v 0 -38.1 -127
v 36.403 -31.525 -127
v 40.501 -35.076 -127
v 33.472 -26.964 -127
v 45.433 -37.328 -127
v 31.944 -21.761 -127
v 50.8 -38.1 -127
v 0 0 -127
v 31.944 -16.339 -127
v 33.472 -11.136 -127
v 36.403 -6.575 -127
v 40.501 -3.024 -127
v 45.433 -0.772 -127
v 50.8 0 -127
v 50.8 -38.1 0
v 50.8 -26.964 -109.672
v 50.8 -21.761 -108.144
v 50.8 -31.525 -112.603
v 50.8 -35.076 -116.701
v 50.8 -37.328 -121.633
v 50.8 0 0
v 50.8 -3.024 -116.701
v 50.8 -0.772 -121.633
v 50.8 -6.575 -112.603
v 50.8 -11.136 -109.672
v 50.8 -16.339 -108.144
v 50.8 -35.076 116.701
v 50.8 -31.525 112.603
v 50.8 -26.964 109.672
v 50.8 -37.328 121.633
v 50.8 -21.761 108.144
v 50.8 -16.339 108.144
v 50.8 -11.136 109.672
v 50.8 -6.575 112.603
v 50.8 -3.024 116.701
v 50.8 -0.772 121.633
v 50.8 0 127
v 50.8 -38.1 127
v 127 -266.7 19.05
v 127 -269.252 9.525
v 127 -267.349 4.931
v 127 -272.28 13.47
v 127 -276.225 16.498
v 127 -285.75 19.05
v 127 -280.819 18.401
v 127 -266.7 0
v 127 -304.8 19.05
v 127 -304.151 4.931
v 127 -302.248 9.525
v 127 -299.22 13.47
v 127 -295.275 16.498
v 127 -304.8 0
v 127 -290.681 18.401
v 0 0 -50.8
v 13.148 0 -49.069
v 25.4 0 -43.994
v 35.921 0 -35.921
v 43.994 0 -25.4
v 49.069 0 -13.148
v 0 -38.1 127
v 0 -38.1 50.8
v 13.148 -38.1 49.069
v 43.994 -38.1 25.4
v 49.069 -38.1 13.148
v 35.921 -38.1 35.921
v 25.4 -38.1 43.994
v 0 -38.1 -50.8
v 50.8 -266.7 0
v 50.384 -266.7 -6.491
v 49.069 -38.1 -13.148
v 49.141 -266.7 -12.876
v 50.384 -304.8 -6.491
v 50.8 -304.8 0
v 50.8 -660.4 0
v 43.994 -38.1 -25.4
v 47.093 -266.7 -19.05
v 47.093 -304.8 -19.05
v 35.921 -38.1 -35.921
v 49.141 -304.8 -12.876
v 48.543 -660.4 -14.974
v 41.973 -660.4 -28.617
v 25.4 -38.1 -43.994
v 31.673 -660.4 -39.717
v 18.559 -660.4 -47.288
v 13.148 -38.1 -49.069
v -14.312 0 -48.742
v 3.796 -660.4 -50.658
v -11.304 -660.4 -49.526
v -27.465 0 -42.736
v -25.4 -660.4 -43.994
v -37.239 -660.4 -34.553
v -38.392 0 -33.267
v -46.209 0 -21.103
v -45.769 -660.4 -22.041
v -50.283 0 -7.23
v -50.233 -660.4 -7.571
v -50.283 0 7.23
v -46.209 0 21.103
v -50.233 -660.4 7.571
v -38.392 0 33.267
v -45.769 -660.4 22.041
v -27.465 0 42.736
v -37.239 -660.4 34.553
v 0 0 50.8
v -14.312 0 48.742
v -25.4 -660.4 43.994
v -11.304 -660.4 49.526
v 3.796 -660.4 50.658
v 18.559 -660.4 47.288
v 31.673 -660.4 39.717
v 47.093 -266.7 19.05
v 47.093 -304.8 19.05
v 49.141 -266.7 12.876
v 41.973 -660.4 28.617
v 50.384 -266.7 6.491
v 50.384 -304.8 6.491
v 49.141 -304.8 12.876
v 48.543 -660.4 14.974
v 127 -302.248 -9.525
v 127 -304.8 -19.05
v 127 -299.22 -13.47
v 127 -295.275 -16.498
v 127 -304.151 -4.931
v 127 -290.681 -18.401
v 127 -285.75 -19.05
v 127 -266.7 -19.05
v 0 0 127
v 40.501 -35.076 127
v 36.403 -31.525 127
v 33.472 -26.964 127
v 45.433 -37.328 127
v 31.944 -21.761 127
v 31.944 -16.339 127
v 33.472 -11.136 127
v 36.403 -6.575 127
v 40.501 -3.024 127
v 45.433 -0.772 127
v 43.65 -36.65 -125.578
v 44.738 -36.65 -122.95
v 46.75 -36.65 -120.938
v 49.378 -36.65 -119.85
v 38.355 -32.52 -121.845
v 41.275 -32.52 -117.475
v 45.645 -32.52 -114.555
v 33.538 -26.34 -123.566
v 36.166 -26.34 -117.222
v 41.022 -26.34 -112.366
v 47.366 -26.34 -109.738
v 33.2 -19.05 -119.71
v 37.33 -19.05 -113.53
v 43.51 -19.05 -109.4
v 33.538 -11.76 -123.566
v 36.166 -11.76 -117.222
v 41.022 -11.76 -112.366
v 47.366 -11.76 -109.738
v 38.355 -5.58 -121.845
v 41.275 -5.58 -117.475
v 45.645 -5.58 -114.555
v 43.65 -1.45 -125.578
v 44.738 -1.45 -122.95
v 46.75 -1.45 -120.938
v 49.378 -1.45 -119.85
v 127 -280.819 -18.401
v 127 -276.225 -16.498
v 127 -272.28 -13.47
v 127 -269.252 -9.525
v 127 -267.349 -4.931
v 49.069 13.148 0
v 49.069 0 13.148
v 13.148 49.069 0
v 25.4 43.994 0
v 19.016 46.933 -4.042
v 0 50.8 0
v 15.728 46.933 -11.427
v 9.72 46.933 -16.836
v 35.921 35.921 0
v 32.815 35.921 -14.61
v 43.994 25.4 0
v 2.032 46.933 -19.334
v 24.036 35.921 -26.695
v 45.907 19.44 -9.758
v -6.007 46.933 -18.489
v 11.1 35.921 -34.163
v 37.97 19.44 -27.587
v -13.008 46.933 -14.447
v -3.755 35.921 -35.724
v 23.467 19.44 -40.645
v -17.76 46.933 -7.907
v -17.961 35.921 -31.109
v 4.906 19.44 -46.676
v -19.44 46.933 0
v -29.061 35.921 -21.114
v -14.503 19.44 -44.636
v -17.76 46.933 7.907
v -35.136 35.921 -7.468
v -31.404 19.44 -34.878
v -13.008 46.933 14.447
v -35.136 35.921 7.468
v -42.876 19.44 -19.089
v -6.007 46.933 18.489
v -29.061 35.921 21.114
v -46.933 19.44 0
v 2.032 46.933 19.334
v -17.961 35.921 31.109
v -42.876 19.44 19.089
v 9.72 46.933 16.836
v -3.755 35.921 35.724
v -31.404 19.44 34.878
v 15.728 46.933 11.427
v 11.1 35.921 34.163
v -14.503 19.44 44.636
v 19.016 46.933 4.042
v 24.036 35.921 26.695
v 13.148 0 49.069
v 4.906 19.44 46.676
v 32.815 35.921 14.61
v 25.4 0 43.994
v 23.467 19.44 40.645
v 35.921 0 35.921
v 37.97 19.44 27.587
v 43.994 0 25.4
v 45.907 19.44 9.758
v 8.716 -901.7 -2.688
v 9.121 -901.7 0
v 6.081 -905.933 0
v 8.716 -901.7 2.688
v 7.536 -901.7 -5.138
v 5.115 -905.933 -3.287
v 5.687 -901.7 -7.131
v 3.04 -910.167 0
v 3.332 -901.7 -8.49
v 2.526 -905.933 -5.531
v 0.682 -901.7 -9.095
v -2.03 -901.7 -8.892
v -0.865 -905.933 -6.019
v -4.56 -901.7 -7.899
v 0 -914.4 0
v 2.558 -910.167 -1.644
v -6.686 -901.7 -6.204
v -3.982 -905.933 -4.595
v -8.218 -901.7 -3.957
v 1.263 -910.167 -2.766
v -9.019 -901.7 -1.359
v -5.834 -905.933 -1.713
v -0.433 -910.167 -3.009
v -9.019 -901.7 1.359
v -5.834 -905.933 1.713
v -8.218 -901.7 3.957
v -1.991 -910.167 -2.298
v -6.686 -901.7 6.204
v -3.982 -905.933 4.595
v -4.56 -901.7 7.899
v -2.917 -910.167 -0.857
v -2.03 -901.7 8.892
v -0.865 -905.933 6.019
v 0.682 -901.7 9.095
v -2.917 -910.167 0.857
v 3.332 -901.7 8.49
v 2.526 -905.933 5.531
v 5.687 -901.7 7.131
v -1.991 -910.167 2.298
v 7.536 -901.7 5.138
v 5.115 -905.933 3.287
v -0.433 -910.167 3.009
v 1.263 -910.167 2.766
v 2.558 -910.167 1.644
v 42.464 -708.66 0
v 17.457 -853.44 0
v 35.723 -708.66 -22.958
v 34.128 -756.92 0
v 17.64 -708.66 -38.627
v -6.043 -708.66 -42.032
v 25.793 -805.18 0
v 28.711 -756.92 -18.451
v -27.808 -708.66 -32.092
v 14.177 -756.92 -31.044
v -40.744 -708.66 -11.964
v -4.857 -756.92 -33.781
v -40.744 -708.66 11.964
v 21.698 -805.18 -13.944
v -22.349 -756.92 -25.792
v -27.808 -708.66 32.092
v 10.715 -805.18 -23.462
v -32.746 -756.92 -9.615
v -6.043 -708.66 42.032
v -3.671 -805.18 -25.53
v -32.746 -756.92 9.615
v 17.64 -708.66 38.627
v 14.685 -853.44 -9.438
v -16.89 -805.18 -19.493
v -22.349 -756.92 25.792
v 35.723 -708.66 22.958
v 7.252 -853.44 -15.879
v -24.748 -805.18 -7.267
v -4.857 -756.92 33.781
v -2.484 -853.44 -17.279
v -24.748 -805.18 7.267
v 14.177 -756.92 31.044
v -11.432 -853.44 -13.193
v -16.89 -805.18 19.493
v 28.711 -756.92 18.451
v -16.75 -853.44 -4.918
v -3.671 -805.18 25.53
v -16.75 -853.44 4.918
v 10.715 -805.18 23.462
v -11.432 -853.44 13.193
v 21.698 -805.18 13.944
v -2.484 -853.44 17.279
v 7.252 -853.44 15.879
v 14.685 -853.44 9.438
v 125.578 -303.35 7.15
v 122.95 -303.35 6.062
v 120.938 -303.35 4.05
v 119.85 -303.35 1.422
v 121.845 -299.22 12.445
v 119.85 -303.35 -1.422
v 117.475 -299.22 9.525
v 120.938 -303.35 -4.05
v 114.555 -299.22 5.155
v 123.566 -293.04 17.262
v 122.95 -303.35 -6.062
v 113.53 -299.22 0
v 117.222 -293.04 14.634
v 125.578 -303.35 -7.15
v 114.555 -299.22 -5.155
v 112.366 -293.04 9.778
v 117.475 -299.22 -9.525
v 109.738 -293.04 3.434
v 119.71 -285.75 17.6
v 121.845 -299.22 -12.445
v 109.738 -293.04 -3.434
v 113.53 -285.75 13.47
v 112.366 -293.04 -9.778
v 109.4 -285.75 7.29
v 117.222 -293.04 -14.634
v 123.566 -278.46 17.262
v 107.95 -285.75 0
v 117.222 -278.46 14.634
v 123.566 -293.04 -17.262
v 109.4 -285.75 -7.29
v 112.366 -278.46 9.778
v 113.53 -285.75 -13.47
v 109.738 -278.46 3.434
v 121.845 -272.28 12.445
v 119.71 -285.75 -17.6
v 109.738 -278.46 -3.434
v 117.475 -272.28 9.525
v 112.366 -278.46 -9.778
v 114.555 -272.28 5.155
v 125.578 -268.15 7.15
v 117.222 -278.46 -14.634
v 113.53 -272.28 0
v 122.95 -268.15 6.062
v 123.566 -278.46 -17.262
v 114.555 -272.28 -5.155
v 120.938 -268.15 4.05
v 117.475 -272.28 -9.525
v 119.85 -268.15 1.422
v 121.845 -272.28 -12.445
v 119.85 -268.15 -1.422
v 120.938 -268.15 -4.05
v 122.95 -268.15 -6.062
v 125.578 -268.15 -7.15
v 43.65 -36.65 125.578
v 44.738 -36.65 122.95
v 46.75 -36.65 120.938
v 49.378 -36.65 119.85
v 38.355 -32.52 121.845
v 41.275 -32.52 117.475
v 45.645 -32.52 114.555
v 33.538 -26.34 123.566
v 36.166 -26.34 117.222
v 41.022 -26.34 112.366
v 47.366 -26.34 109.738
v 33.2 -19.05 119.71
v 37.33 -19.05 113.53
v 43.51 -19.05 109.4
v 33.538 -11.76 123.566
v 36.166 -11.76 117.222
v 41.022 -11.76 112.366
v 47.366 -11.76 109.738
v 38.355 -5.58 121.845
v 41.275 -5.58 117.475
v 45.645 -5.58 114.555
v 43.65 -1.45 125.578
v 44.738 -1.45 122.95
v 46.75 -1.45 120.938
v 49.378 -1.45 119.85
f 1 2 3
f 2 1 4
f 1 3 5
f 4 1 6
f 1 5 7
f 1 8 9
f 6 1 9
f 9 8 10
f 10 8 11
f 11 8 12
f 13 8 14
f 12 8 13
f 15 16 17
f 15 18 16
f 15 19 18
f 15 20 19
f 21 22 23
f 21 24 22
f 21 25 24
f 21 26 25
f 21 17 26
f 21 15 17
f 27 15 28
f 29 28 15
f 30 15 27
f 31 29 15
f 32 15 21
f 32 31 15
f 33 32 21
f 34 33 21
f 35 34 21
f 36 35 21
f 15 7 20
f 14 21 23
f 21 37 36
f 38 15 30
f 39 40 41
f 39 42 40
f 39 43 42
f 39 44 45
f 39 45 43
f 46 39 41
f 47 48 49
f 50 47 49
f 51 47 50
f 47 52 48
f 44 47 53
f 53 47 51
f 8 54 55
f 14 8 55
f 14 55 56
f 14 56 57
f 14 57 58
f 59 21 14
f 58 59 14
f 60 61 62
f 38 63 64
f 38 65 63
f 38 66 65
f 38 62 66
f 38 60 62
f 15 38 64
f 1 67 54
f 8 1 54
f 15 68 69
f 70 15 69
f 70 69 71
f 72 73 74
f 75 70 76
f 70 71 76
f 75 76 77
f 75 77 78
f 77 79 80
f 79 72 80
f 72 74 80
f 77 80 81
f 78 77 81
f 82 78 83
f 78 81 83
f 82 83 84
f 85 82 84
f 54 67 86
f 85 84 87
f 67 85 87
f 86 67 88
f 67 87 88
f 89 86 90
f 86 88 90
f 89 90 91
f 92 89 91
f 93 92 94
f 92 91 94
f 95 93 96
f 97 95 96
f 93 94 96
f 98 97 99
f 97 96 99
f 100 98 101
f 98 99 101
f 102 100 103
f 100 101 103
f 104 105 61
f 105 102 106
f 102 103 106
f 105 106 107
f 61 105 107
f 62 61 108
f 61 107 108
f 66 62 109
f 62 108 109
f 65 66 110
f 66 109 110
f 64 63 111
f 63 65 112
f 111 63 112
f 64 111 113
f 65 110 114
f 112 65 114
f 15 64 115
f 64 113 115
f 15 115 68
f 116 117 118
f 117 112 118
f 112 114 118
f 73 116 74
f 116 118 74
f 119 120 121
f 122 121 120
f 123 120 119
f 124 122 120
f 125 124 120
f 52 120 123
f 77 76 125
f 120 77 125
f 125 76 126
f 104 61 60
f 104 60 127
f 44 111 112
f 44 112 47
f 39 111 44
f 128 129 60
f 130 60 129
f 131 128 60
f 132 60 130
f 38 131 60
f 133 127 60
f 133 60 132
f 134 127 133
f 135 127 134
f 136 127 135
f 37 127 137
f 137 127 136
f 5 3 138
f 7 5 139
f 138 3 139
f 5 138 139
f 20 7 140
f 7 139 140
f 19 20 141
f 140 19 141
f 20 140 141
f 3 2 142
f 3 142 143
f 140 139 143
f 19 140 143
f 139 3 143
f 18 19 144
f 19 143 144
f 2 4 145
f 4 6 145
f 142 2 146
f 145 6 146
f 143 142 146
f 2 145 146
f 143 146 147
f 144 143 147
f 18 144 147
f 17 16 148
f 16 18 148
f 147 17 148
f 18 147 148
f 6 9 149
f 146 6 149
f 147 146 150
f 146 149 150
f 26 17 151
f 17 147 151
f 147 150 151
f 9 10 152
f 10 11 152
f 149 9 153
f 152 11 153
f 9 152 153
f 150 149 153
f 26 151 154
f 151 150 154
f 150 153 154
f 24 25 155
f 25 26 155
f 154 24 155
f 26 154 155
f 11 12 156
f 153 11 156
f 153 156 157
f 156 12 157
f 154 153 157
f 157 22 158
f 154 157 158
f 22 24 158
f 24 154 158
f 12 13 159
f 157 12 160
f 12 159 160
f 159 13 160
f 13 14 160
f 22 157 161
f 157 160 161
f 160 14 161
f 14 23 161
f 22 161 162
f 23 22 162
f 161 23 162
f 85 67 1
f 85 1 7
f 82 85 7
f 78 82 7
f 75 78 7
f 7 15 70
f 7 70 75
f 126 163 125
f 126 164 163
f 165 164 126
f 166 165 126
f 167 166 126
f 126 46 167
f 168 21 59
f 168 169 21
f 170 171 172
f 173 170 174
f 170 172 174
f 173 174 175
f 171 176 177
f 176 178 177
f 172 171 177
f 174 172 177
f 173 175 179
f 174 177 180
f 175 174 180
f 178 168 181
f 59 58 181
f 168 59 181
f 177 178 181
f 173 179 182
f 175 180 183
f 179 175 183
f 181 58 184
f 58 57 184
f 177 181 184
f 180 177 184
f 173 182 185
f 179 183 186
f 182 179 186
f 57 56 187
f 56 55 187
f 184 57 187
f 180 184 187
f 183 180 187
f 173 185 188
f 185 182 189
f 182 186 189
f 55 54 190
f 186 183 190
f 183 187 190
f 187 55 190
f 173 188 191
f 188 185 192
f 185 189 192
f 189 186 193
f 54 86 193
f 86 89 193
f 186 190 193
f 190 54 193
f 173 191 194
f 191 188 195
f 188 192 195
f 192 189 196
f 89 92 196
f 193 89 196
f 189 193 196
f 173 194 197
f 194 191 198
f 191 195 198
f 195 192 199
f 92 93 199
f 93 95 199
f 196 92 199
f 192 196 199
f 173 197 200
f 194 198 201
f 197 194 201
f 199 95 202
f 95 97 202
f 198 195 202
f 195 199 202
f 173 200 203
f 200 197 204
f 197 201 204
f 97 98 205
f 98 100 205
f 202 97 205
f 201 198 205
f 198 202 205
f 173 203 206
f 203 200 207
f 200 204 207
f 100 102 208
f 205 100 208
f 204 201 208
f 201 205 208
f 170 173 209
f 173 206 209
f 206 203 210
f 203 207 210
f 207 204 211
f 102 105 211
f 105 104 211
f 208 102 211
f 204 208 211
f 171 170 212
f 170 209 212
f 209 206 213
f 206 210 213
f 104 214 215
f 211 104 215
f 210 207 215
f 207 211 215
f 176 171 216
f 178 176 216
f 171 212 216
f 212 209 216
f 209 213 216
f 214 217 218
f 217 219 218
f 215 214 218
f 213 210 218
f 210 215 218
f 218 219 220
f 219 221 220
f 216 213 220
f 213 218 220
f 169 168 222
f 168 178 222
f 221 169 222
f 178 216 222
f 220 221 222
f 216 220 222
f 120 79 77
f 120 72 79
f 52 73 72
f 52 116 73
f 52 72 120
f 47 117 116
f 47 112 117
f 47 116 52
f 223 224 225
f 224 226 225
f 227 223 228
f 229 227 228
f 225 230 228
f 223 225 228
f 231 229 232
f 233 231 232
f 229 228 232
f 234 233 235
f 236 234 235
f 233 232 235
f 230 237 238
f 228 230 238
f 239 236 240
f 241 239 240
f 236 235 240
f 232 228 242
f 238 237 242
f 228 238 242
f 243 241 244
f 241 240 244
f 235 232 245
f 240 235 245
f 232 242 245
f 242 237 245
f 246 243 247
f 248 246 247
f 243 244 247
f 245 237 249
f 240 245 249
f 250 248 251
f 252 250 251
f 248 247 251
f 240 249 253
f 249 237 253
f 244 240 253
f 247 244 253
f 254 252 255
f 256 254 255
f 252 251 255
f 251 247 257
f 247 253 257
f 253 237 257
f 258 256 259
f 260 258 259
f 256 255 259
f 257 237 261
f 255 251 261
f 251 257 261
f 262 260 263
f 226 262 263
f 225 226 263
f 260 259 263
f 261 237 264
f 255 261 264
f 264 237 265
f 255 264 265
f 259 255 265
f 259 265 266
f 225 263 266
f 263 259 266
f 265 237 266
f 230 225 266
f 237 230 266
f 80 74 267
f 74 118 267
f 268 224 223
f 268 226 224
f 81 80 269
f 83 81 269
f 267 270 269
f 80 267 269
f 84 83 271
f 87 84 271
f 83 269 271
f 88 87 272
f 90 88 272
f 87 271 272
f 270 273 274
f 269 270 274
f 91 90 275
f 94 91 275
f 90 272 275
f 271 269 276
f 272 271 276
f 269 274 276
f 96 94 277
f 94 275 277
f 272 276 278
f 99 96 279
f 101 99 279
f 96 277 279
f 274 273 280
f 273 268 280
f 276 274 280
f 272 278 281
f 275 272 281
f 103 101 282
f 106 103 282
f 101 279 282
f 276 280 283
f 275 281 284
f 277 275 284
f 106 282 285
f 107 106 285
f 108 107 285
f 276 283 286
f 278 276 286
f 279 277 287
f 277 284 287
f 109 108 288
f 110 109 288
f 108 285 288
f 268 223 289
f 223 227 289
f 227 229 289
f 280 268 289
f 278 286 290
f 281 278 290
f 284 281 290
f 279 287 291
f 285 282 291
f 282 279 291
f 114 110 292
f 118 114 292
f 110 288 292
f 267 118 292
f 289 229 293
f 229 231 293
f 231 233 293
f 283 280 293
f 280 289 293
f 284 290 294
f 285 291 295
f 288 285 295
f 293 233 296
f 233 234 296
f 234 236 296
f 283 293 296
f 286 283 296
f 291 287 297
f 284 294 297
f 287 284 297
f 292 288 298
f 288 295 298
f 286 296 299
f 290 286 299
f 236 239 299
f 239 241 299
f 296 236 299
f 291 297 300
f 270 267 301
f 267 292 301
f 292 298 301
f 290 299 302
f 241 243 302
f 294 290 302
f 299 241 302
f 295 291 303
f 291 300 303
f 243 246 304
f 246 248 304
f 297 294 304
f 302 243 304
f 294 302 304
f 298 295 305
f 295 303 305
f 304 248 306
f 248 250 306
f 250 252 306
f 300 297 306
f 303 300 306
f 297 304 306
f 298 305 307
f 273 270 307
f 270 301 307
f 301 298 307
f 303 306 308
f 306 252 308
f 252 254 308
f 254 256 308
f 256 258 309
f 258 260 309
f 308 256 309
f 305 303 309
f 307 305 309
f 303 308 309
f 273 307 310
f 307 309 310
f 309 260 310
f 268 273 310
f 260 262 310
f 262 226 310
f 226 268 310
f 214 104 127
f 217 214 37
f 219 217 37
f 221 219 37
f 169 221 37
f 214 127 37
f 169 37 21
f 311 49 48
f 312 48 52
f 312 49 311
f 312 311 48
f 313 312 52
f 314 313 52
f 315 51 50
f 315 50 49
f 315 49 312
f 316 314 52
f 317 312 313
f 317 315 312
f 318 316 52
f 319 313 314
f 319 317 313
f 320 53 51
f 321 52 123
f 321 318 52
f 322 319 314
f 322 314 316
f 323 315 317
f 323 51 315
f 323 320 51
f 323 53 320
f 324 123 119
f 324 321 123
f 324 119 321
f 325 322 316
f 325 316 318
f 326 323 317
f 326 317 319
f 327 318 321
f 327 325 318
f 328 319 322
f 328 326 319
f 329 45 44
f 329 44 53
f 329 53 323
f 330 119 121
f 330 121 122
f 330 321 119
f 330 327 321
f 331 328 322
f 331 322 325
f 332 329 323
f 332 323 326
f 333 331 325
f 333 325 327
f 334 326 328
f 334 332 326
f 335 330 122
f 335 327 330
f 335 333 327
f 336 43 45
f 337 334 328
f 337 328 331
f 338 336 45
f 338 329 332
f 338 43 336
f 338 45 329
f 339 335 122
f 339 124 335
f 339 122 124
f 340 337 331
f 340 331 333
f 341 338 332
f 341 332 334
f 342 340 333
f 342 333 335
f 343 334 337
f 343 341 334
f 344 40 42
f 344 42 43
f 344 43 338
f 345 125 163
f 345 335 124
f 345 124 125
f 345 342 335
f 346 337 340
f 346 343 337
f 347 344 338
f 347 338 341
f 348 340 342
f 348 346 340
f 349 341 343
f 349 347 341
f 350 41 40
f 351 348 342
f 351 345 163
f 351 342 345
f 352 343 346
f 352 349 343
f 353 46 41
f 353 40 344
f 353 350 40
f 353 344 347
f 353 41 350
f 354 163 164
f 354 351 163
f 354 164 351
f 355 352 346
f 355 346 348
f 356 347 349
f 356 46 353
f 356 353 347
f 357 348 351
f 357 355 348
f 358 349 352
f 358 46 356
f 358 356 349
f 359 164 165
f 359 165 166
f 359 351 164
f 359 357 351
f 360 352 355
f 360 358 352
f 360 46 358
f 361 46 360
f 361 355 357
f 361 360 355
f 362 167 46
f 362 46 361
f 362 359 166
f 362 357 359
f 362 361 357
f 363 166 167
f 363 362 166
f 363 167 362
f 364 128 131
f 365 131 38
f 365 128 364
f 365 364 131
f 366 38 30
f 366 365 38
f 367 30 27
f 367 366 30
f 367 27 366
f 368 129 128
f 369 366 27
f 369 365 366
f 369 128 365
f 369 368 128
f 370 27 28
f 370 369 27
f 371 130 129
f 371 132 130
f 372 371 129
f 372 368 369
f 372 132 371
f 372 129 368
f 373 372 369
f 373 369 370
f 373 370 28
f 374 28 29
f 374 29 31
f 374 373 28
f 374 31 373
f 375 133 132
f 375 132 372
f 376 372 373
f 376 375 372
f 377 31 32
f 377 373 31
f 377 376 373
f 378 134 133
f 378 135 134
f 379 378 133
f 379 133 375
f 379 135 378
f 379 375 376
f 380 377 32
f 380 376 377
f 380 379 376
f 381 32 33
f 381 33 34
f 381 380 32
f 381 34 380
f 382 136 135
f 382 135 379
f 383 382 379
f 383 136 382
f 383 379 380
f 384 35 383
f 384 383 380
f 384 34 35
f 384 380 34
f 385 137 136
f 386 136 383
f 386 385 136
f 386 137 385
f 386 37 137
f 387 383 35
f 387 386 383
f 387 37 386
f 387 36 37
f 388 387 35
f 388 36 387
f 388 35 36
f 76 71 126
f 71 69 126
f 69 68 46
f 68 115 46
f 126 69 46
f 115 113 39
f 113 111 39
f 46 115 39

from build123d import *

# Parameters (mm, degrees)
SKETCH4_W           = 50.8
SKETCH4_H           = 38.1
BOSS_EXTRUDE3_DEPTH = 127
SKETCH2_W           = 127
SKETCH2_H           = 38.1
BOSS_EXTRUDE2_DEPTH = 19.05


with BuildPart() as part:
    # Sketch1 → Revolve1 (revolve)
    with BuildSketch(Plane.XY):
        with BuildLine():
            Line((50.8, 0), (50.8, -660.4))
            Line((50.8, -660.4), (9.120840186, -901.7))
            Line((9.120840186, -901.7), (0, -914.4))
            Line((0, -914.4), (0, 50.8))
            ThreePointArc((0, 50.8), (35.921024484, 35.921024484), (50.8, 0))
        make_face()
    revolve(axis=Axis((0, -914.4, 0), (0, 1, 0)))

    # Sketch4 → Boss-Extrude3 (add, symmetric)
    with BuildSketch(Plane.XY):
        with Locations((25.4, -19.05)):
            Rectangle(SKETCH4_W, SKETCH4_H)
    extrude(amount=BOSS_EXTRUDE3_DEPTH, both=True)

    # Sketch2 → Boss-Extrude2 (add, symmetric)
    with BuildSketch(Plane.XY):
        with Locations((63.5, -285.75)):
            Rectangle(SKETCH2_W, SKETCH2_H)
    extrude(amount=BOSS_EXTRUDE2_DEPTH, both=True)

    # Sketch5 → Cut-Revolve1 (revolve, cut)
    with BuildSketch(Plane.XY.offset(127)):
        with BuildLine():
            Line((50.8, 0), (50.8, -38.1))
            ThreePointArc((50.8, -38.1), (31.75, -19.05), (50.8, 0))
        make_face()
    cut_revolve1 = revolve(axis=Axis((50.8, 0, 127), (0, -1, 0)), mode=Mode.SUBTRACT)

    # Mirror1: Cut-Revolve1 across plane
    add(cut_revolve1.mirror(Plane.XY), mode=Mode.SUBTRACT)

    # Sketch6 → Cut-Revolve2 (revolve, cut)
    with BuildSketch(Plane.XY):
        with BuildLine():
            Line((127, -266.7), (127, -304.8))
            ThreePointArc((127, -304.8), (107.95, -285.75), (127, -266.7))
        make_face()
    revolve(axis=Axis((127, -266.7, 0), (0, -1, 0)), mode=Mode.SUBTRACT)


solid = part.part
